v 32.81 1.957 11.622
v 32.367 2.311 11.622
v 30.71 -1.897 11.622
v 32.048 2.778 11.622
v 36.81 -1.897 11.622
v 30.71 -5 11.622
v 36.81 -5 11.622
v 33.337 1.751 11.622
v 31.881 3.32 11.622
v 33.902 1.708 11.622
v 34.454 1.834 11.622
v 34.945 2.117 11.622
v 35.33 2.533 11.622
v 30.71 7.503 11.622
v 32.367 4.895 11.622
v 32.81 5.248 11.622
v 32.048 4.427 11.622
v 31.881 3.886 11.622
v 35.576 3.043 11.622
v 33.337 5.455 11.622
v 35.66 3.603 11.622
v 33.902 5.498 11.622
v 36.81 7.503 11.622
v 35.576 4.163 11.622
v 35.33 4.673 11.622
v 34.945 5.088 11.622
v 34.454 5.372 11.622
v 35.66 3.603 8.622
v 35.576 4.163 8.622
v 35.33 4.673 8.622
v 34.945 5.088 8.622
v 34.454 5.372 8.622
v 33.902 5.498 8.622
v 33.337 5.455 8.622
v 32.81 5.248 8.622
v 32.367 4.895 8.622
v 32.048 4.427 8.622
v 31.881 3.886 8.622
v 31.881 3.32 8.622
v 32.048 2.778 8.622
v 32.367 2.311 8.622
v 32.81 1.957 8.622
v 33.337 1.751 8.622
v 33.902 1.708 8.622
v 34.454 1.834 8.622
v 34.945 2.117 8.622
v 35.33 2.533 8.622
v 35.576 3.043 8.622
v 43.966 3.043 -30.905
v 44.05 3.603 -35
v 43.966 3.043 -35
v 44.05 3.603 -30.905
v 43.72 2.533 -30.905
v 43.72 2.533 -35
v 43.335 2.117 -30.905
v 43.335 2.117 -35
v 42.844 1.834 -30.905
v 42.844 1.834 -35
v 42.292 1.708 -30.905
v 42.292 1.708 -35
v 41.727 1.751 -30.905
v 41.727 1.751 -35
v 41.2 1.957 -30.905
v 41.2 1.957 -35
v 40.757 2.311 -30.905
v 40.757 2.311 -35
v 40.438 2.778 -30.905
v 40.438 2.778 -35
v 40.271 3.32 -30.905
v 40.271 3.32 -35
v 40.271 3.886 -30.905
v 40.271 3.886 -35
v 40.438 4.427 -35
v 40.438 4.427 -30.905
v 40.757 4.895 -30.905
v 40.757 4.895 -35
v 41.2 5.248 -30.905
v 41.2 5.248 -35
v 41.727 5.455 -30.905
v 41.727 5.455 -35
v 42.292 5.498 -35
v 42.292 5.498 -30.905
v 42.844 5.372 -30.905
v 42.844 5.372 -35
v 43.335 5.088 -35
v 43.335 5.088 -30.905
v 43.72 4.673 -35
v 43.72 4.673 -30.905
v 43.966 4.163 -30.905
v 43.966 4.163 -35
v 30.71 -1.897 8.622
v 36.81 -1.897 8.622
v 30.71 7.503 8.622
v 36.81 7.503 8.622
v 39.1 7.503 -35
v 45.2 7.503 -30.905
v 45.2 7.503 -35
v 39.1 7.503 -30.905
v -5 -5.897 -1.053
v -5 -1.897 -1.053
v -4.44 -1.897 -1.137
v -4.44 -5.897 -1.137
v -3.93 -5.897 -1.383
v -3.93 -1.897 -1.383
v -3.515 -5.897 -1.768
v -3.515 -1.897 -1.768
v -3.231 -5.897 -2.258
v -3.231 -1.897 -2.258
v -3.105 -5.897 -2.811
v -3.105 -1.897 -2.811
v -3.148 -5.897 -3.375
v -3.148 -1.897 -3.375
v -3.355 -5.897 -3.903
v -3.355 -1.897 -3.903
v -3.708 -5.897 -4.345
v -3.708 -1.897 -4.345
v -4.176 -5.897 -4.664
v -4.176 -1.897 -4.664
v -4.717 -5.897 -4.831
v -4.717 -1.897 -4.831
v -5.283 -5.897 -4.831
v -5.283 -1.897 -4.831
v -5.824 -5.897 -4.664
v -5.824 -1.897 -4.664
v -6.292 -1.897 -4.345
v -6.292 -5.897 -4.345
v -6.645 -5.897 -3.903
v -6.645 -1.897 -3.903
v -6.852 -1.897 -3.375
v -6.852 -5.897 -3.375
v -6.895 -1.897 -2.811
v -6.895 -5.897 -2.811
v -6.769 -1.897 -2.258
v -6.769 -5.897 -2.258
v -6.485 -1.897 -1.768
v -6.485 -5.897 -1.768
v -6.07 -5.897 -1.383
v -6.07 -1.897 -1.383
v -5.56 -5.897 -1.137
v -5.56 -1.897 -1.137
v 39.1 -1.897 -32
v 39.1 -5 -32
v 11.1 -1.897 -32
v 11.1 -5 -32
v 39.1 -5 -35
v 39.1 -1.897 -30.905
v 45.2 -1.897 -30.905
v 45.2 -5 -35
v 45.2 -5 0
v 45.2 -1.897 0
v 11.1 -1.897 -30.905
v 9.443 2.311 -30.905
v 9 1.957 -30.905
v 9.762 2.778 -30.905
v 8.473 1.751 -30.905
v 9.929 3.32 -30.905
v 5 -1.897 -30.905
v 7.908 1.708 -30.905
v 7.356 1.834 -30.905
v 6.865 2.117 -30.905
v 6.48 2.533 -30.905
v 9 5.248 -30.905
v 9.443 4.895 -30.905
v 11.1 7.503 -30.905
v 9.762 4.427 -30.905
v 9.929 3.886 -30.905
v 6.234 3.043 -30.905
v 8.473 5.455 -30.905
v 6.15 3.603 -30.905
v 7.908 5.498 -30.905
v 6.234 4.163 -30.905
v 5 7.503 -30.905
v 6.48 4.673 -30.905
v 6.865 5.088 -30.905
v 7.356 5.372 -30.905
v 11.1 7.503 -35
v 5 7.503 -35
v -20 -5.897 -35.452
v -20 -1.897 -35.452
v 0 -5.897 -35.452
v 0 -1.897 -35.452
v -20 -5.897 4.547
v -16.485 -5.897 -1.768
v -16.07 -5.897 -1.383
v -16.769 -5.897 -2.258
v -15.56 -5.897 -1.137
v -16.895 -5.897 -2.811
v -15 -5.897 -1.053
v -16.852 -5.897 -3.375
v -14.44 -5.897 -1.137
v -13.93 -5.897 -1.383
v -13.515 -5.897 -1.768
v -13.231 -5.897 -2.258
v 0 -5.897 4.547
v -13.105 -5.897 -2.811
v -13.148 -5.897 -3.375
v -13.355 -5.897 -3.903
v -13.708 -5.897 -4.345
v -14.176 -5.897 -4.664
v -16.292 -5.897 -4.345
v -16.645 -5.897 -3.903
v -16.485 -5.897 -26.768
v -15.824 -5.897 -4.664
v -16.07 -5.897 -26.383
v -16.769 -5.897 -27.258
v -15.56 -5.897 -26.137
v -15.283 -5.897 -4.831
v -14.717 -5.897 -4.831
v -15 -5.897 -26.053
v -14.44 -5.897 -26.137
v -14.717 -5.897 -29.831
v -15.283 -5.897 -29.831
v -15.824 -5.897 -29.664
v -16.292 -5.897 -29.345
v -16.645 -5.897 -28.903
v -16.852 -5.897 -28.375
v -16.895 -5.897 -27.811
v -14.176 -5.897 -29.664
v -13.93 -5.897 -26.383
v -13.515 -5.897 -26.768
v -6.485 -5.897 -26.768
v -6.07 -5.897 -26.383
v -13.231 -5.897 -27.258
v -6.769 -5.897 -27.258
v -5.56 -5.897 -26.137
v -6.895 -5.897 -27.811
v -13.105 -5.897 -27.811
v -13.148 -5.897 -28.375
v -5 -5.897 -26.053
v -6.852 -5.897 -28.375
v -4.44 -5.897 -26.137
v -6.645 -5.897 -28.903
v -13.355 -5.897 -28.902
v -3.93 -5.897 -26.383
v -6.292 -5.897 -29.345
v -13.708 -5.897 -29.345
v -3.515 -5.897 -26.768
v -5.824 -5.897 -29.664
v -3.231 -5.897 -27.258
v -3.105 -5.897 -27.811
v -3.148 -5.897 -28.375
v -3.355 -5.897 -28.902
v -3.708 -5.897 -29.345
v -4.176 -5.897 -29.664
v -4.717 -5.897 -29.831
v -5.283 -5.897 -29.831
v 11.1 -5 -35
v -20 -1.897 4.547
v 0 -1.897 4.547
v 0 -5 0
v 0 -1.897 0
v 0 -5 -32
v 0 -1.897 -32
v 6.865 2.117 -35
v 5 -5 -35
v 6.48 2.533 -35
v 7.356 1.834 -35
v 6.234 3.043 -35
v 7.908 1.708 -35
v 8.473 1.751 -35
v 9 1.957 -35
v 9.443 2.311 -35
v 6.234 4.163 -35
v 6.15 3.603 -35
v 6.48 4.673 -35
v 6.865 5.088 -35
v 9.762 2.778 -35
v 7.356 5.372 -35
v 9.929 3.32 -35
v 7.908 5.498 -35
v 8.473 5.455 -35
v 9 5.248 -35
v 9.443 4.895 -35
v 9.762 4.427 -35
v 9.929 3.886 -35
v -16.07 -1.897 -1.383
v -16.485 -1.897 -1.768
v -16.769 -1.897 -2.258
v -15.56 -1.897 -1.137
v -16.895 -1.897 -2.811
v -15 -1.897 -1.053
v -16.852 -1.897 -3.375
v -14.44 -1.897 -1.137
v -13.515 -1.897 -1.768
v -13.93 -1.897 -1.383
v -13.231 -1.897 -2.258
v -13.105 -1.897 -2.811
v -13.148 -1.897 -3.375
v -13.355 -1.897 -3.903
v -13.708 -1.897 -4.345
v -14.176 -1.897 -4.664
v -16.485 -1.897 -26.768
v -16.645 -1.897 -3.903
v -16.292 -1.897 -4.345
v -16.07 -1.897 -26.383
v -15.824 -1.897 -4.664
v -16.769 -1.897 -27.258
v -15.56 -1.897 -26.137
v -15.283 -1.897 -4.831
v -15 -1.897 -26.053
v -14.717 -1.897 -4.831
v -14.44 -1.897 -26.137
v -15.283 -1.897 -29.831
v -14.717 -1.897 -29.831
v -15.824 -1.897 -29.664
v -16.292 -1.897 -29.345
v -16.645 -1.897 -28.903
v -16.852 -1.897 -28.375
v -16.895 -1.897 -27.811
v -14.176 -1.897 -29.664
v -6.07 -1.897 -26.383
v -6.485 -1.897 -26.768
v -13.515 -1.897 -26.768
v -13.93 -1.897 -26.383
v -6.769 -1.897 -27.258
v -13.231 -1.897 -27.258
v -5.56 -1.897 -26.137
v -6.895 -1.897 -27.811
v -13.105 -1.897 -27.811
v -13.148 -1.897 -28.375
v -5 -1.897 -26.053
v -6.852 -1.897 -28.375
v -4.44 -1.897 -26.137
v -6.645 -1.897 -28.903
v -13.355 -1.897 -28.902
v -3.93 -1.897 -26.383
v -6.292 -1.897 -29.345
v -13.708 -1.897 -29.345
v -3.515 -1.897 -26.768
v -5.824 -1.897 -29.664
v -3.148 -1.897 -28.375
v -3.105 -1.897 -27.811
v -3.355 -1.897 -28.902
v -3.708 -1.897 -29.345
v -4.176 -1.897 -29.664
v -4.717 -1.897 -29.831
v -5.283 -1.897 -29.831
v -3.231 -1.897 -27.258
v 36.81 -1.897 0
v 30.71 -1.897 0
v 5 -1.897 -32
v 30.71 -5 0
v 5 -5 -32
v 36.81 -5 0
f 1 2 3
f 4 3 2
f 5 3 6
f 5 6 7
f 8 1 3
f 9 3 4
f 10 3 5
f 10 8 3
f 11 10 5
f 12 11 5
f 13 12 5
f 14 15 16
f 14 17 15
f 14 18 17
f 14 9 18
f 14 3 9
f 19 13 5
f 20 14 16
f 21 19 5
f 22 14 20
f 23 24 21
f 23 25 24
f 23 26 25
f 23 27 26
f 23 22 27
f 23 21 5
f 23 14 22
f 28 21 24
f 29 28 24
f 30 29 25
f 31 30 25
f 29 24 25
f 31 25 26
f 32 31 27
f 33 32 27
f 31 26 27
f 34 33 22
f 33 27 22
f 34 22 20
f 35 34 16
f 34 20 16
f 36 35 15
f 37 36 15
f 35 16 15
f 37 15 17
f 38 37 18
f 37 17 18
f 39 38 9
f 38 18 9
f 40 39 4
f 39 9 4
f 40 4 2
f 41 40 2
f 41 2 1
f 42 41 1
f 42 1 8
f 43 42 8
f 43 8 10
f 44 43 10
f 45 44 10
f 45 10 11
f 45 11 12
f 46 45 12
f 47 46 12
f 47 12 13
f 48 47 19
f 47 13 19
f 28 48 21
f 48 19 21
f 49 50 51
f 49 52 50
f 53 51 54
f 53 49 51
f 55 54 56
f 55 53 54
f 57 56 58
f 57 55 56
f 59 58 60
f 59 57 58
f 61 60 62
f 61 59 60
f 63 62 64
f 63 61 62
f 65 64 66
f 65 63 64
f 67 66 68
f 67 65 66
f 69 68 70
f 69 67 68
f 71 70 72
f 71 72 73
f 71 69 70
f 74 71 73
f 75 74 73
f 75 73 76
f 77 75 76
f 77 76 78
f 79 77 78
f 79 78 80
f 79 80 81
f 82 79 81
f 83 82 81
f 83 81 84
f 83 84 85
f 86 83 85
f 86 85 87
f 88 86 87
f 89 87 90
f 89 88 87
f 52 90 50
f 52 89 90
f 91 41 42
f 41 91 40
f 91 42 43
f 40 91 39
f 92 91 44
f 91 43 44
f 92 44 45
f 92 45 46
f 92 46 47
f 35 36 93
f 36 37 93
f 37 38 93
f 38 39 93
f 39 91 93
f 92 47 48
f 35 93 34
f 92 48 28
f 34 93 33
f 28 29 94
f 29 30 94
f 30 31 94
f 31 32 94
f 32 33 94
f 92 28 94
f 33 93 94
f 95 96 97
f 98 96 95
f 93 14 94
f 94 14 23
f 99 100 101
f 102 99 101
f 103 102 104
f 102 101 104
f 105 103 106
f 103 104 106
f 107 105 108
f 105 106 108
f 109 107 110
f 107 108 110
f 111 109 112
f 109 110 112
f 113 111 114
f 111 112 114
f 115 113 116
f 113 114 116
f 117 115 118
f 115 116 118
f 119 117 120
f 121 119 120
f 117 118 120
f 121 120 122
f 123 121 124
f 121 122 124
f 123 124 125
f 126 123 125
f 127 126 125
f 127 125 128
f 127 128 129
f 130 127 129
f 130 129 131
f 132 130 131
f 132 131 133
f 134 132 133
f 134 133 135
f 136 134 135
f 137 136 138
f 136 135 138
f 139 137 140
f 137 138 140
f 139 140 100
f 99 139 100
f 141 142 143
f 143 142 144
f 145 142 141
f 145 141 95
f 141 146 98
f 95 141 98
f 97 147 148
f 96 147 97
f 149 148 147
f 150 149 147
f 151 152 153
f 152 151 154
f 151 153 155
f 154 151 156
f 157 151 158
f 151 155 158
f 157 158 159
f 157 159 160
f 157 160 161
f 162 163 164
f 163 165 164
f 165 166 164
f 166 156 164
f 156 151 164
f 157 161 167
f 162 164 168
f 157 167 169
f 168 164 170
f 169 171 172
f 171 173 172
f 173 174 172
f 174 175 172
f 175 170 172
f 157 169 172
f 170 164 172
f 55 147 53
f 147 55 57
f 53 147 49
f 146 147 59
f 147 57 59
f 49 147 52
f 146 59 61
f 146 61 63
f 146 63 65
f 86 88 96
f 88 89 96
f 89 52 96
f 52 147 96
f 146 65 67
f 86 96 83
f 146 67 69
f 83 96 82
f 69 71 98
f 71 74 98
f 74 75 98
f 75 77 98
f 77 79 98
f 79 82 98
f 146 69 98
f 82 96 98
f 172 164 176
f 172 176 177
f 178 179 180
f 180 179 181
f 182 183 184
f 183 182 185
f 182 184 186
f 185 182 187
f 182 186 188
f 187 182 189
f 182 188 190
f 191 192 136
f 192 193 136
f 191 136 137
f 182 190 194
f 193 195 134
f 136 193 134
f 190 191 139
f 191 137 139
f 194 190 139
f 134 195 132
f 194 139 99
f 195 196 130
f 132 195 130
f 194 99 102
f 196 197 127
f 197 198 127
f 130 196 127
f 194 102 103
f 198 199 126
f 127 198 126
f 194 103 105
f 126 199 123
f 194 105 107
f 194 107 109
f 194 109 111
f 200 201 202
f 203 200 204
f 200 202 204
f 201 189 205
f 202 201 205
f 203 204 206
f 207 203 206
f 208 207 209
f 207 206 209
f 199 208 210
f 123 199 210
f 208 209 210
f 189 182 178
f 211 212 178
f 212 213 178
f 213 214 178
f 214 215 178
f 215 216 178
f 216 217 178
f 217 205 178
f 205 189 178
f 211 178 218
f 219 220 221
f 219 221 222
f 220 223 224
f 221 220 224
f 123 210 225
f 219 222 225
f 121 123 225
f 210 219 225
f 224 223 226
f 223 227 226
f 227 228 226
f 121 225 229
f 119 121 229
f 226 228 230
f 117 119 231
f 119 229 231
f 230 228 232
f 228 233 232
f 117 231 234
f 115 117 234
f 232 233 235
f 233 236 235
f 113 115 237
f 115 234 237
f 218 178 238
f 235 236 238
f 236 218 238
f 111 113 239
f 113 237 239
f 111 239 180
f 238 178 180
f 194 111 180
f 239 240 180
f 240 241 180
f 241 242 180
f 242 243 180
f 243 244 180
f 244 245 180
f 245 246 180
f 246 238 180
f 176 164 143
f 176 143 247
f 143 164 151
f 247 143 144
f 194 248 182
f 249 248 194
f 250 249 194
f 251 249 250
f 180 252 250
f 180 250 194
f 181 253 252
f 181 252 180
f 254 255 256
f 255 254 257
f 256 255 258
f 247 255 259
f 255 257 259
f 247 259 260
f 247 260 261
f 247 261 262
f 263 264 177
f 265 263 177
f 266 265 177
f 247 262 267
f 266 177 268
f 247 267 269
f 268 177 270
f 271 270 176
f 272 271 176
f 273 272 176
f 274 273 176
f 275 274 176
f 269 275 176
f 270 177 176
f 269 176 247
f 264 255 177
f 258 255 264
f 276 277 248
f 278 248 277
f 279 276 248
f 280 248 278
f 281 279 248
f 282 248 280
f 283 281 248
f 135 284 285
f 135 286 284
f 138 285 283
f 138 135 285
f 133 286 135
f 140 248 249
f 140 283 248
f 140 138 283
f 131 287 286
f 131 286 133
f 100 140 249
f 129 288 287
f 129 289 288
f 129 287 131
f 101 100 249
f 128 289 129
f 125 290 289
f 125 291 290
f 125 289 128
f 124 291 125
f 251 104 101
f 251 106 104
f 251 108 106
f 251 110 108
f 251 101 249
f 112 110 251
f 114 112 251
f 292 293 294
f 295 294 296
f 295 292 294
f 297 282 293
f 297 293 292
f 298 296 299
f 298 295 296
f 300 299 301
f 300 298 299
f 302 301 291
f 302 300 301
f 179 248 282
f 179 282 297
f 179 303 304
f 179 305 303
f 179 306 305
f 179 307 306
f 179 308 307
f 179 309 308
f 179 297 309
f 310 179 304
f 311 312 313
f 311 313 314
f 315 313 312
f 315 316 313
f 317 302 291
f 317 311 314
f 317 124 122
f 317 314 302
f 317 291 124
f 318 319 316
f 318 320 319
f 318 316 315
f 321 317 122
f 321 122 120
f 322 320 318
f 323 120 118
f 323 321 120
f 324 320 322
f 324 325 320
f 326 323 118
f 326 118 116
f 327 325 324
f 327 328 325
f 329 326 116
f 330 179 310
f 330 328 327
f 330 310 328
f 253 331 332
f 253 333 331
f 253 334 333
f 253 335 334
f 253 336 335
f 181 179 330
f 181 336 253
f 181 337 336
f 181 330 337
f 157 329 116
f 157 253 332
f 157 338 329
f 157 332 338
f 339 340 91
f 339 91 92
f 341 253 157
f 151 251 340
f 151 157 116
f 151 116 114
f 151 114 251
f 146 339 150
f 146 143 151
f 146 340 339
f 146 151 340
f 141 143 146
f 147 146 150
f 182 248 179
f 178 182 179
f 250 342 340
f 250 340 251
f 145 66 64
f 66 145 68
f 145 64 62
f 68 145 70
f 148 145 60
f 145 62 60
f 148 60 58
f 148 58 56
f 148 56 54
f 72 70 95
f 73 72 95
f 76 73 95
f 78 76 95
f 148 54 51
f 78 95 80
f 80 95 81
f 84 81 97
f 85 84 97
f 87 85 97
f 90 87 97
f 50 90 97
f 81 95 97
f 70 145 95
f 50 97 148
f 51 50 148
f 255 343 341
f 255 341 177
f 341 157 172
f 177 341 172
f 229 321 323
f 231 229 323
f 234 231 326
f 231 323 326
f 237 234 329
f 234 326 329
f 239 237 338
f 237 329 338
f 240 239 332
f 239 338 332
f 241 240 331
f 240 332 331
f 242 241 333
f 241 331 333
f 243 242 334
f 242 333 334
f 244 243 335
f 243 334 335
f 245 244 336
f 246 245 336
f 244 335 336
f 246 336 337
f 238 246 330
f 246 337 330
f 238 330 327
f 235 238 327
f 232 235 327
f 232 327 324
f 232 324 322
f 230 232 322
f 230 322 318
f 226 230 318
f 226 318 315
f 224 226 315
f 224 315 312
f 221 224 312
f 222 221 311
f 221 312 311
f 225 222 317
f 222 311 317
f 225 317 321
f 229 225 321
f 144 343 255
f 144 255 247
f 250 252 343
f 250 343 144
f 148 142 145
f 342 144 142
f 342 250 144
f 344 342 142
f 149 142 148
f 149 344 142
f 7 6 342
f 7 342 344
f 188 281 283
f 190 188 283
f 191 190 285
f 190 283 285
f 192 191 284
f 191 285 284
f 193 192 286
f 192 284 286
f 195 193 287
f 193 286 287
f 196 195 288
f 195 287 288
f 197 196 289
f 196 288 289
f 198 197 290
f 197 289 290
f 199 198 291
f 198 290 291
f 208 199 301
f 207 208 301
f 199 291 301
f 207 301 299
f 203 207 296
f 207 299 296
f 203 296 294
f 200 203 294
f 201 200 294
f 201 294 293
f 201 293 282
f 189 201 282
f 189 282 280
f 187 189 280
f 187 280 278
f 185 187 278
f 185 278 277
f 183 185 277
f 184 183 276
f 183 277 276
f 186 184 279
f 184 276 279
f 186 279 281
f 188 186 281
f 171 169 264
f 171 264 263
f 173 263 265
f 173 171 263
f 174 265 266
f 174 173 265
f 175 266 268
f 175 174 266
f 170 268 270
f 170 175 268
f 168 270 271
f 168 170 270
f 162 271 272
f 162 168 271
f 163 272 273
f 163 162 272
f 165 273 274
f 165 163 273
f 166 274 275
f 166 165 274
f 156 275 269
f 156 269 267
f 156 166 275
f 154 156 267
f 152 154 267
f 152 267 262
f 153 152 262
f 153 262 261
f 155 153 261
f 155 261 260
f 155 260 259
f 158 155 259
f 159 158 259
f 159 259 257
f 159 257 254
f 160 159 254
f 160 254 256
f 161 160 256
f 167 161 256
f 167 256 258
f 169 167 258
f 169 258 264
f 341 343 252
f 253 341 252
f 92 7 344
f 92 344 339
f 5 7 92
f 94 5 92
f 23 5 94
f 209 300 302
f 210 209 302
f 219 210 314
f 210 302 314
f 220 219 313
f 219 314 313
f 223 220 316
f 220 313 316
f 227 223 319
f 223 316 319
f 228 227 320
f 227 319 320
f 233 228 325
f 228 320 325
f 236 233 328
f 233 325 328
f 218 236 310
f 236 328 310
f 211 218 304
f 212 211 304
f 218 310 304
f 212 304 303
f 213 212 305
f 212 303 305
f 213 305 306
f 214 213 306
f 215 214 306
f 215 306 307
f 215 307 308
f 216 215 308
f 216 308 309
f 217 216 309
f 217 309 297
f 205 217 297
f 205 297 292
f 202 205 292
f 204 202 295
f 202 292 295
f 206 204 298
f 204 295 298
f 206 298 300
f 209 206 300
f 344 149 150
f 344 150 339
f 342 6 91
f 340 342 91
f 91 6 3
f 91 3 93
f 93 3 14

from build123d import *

# Parameters (mm, degrees)
SKETCH2_W           = 75
SKETCH2_H           = 32
BOSS_EXTRUDE2_DEPTH = 3.102863873
SKETCH4_W           = 6.1
SKETCH4_H           = 9.4
SKETCH4_R           = 1.9
BOSS_EXTRUDE4_DEPTH = 1.095
SKETCH7_W           = 14.8
SKETCH7_H           = 32
TRIM_DEPTH          = 69.646631381
SKETCH8_W           = 6.1
SKETCH8_H           = 11.621856523
BOSS_EXTRUDE6_DEPTH = 3.102863873
SKETCH5_W           = 6.1
SKETCH5_H           = 9.4
SKETCH5_R           = 1.9
BOSS_EXTRUDE5_DEPTH = 3
SKETCH9_R           = 1.9
BOSS_EXTRUDE8_DEPTH = 3
SKETCH10_W          = 20
SKETCH10_H          = 40
BOSS_EXTRUDE9_DEPTH = 4
SKETCH11_R          = 1.9
CUT_EXTRUDE2_DEPTH  = 4


with BuildPart() as part:
    # Sketch2 → Boss-Extrude2 (new body)
    with BuildSketch(Plane(origin=(0, -5, 0), x_dir=(-1, 0, 0), z_dir=(0, -1, 0))):
        with Locations((-22.5, 16)):
            Rectangle(SKETCH2_W, SKETCH2_H)
    extrude(amount=-BOSS_EXTRUDE2_DEPTH)

    # Sketch4 → Boss-Extrude4 (add)
    # profile 1 of 2: a face of its own
    with BuildSketch(Plane(origin=(0, 0, -30.905), x_dir=(-1, 0, 0), z_dir=(0, 0, -1))):
        with Locations((-8.05, 2.802863873)):
            Rectangle(SKETCH4_W, SKETCH4_H)
        with Locations((-8.05, 3.602863873)):
            Circle(SKETCH4_R, mode=Mode.SUBTRACT)
    # profile 2 of 2: a face of its own
    with BuildSketch(Plane(origin=(0, 0, -30.905), x_dir=(-1, 0, 0), z_dir=(0, 0, -1))):
        with Locations((-42.15, 2.802863873)):
            Rectangle(SKETCH4_W, SKETCH4_H)
        with Locations(Location((-42.15, 3.602863873, 0), (0, 0, 180))):
            Circle(SKETCH4_R, mode=Mode.SUBTRACT)
    extrude(amount=BOSS_EXTRUDE4_DEPTH)

    # Sketch7 → trim (cut, through all)
    with BuildSketch(Plane(origin=(0, -1.897136127, 0), x_dir=(1, 0, 0), z_dir=(0, 1, 0))):
        with Locations((52.6, 16)):
            Rectangle(SKETCH7_W, SKETCH7_H)
    extrude(amount=-TRIM_DEPTH, mode=Mode.SUBTRACT)

    # Sketch8 → Boss-Extrude6 (add)
    with BuildSketch(Plane(origin=(0, -1.897136127, 0), x_dir=(1, 0, 0), z_dir=(0, 1, 0))):
        with Locations((33.76, -5.810928261)):
            Rectangle(SKETCH8_W, SKETCH8_H)
    extrude(amount=-BOSS_EXTRUDE6_DEPTH)

    # Sketch5 → Boss-Extrude5 (add)
    with BuildSketch(Plane.XY.offset(11.621856523)):
        with Locations((33.76, 2.802863873)):
            Rectangle(SKETCH5_W, SKETCH5_H)
        with Locations((33.76, 3.602863873)):
            Circle(SKETCH5_R, mode=Mode.SUBTRACT)
    extrude(amount=-BOSS_EXTRUDE5_DEPTH)

    # Sketch9 → Boss-Extrude8 (add)
    # profile 1 of 2: a face of its own
    with BuildSketch(Plane(origin=(0, 0, -32), x_dir=(-1, 0, 0), z_dir=(0, 0, -1))):
        Polygon((-45.2, 7.502863873), (-39.1, 7.502863873), (-39.1, -1.897136127), (-39.1, -5), (-45.2, -5), align=None)
        with Locations(Location((-42.15, 3.602863873, 0), (0, 0, 180))):
            Circle(SKETCH9_R, mode=Mode.SUBTRACT)
    # profile 2 of 2: a face of its own
    with BuildSketch(Plane(origin=(0, 0, -32), x_dir=(-1, 0, 0), z_dir=(0, 0, -1))):
        Polygon((-11.1, -1.897136127), (-11.1, 7.502863873), (-5, 7.502863873), (-5, -1.897136127), (-5, -5), (-11.1, -5), align=None)
        with Locations((-8.05, 3.602863873)):
            Circle(SKETCH9_R, mode=Mode.SUBTRACT)
    extrude(amount=BOSS_EXTRUDE8_DEPTH)

    # Sketch10 → Boss-Extrude9 (add)
    with BuildSketch(Plane(origin=(0, -1.897136127, 0), x_dir=(1, 0, 0), z_dir=(0, 1, 0))):
        with Locations((-10, 15.4525)):
            Rectangle(SKETCH10_W, SKETCH10_H)
    extrude(amount=-BOSS_EXTRUDE9_DEPTH)

    # Sketch11 → Cut-Extrude2 (cut)
    with BuildSketch(Plane(origin=(0, -1.897136127, 0), x_dir=(1, 0, 0), z_dir=(0, 1, 0))):
        with Locations(Location((-15, 27.9525, 0), (0, 0, 270))):
            Circle(SKETCH11_R)
        with Locations(Location((-5, 27.9525, 0), (0, 0, 270))):
            Circle(SKETCH11_R)
        with Locations(Location((-15, 2.9525, 0), (0, 0, 270))):
            Circle(SKETCH11_R)
        with Locations(Location((-5, 2.9525, 0), (0, 0, 270))):
            Circle(SKETCH11_R)
    extrude(amount=-CUT_EXTRUDE2_DEPTH, mode=Mode.SUBTRACT)


solid = part.part
